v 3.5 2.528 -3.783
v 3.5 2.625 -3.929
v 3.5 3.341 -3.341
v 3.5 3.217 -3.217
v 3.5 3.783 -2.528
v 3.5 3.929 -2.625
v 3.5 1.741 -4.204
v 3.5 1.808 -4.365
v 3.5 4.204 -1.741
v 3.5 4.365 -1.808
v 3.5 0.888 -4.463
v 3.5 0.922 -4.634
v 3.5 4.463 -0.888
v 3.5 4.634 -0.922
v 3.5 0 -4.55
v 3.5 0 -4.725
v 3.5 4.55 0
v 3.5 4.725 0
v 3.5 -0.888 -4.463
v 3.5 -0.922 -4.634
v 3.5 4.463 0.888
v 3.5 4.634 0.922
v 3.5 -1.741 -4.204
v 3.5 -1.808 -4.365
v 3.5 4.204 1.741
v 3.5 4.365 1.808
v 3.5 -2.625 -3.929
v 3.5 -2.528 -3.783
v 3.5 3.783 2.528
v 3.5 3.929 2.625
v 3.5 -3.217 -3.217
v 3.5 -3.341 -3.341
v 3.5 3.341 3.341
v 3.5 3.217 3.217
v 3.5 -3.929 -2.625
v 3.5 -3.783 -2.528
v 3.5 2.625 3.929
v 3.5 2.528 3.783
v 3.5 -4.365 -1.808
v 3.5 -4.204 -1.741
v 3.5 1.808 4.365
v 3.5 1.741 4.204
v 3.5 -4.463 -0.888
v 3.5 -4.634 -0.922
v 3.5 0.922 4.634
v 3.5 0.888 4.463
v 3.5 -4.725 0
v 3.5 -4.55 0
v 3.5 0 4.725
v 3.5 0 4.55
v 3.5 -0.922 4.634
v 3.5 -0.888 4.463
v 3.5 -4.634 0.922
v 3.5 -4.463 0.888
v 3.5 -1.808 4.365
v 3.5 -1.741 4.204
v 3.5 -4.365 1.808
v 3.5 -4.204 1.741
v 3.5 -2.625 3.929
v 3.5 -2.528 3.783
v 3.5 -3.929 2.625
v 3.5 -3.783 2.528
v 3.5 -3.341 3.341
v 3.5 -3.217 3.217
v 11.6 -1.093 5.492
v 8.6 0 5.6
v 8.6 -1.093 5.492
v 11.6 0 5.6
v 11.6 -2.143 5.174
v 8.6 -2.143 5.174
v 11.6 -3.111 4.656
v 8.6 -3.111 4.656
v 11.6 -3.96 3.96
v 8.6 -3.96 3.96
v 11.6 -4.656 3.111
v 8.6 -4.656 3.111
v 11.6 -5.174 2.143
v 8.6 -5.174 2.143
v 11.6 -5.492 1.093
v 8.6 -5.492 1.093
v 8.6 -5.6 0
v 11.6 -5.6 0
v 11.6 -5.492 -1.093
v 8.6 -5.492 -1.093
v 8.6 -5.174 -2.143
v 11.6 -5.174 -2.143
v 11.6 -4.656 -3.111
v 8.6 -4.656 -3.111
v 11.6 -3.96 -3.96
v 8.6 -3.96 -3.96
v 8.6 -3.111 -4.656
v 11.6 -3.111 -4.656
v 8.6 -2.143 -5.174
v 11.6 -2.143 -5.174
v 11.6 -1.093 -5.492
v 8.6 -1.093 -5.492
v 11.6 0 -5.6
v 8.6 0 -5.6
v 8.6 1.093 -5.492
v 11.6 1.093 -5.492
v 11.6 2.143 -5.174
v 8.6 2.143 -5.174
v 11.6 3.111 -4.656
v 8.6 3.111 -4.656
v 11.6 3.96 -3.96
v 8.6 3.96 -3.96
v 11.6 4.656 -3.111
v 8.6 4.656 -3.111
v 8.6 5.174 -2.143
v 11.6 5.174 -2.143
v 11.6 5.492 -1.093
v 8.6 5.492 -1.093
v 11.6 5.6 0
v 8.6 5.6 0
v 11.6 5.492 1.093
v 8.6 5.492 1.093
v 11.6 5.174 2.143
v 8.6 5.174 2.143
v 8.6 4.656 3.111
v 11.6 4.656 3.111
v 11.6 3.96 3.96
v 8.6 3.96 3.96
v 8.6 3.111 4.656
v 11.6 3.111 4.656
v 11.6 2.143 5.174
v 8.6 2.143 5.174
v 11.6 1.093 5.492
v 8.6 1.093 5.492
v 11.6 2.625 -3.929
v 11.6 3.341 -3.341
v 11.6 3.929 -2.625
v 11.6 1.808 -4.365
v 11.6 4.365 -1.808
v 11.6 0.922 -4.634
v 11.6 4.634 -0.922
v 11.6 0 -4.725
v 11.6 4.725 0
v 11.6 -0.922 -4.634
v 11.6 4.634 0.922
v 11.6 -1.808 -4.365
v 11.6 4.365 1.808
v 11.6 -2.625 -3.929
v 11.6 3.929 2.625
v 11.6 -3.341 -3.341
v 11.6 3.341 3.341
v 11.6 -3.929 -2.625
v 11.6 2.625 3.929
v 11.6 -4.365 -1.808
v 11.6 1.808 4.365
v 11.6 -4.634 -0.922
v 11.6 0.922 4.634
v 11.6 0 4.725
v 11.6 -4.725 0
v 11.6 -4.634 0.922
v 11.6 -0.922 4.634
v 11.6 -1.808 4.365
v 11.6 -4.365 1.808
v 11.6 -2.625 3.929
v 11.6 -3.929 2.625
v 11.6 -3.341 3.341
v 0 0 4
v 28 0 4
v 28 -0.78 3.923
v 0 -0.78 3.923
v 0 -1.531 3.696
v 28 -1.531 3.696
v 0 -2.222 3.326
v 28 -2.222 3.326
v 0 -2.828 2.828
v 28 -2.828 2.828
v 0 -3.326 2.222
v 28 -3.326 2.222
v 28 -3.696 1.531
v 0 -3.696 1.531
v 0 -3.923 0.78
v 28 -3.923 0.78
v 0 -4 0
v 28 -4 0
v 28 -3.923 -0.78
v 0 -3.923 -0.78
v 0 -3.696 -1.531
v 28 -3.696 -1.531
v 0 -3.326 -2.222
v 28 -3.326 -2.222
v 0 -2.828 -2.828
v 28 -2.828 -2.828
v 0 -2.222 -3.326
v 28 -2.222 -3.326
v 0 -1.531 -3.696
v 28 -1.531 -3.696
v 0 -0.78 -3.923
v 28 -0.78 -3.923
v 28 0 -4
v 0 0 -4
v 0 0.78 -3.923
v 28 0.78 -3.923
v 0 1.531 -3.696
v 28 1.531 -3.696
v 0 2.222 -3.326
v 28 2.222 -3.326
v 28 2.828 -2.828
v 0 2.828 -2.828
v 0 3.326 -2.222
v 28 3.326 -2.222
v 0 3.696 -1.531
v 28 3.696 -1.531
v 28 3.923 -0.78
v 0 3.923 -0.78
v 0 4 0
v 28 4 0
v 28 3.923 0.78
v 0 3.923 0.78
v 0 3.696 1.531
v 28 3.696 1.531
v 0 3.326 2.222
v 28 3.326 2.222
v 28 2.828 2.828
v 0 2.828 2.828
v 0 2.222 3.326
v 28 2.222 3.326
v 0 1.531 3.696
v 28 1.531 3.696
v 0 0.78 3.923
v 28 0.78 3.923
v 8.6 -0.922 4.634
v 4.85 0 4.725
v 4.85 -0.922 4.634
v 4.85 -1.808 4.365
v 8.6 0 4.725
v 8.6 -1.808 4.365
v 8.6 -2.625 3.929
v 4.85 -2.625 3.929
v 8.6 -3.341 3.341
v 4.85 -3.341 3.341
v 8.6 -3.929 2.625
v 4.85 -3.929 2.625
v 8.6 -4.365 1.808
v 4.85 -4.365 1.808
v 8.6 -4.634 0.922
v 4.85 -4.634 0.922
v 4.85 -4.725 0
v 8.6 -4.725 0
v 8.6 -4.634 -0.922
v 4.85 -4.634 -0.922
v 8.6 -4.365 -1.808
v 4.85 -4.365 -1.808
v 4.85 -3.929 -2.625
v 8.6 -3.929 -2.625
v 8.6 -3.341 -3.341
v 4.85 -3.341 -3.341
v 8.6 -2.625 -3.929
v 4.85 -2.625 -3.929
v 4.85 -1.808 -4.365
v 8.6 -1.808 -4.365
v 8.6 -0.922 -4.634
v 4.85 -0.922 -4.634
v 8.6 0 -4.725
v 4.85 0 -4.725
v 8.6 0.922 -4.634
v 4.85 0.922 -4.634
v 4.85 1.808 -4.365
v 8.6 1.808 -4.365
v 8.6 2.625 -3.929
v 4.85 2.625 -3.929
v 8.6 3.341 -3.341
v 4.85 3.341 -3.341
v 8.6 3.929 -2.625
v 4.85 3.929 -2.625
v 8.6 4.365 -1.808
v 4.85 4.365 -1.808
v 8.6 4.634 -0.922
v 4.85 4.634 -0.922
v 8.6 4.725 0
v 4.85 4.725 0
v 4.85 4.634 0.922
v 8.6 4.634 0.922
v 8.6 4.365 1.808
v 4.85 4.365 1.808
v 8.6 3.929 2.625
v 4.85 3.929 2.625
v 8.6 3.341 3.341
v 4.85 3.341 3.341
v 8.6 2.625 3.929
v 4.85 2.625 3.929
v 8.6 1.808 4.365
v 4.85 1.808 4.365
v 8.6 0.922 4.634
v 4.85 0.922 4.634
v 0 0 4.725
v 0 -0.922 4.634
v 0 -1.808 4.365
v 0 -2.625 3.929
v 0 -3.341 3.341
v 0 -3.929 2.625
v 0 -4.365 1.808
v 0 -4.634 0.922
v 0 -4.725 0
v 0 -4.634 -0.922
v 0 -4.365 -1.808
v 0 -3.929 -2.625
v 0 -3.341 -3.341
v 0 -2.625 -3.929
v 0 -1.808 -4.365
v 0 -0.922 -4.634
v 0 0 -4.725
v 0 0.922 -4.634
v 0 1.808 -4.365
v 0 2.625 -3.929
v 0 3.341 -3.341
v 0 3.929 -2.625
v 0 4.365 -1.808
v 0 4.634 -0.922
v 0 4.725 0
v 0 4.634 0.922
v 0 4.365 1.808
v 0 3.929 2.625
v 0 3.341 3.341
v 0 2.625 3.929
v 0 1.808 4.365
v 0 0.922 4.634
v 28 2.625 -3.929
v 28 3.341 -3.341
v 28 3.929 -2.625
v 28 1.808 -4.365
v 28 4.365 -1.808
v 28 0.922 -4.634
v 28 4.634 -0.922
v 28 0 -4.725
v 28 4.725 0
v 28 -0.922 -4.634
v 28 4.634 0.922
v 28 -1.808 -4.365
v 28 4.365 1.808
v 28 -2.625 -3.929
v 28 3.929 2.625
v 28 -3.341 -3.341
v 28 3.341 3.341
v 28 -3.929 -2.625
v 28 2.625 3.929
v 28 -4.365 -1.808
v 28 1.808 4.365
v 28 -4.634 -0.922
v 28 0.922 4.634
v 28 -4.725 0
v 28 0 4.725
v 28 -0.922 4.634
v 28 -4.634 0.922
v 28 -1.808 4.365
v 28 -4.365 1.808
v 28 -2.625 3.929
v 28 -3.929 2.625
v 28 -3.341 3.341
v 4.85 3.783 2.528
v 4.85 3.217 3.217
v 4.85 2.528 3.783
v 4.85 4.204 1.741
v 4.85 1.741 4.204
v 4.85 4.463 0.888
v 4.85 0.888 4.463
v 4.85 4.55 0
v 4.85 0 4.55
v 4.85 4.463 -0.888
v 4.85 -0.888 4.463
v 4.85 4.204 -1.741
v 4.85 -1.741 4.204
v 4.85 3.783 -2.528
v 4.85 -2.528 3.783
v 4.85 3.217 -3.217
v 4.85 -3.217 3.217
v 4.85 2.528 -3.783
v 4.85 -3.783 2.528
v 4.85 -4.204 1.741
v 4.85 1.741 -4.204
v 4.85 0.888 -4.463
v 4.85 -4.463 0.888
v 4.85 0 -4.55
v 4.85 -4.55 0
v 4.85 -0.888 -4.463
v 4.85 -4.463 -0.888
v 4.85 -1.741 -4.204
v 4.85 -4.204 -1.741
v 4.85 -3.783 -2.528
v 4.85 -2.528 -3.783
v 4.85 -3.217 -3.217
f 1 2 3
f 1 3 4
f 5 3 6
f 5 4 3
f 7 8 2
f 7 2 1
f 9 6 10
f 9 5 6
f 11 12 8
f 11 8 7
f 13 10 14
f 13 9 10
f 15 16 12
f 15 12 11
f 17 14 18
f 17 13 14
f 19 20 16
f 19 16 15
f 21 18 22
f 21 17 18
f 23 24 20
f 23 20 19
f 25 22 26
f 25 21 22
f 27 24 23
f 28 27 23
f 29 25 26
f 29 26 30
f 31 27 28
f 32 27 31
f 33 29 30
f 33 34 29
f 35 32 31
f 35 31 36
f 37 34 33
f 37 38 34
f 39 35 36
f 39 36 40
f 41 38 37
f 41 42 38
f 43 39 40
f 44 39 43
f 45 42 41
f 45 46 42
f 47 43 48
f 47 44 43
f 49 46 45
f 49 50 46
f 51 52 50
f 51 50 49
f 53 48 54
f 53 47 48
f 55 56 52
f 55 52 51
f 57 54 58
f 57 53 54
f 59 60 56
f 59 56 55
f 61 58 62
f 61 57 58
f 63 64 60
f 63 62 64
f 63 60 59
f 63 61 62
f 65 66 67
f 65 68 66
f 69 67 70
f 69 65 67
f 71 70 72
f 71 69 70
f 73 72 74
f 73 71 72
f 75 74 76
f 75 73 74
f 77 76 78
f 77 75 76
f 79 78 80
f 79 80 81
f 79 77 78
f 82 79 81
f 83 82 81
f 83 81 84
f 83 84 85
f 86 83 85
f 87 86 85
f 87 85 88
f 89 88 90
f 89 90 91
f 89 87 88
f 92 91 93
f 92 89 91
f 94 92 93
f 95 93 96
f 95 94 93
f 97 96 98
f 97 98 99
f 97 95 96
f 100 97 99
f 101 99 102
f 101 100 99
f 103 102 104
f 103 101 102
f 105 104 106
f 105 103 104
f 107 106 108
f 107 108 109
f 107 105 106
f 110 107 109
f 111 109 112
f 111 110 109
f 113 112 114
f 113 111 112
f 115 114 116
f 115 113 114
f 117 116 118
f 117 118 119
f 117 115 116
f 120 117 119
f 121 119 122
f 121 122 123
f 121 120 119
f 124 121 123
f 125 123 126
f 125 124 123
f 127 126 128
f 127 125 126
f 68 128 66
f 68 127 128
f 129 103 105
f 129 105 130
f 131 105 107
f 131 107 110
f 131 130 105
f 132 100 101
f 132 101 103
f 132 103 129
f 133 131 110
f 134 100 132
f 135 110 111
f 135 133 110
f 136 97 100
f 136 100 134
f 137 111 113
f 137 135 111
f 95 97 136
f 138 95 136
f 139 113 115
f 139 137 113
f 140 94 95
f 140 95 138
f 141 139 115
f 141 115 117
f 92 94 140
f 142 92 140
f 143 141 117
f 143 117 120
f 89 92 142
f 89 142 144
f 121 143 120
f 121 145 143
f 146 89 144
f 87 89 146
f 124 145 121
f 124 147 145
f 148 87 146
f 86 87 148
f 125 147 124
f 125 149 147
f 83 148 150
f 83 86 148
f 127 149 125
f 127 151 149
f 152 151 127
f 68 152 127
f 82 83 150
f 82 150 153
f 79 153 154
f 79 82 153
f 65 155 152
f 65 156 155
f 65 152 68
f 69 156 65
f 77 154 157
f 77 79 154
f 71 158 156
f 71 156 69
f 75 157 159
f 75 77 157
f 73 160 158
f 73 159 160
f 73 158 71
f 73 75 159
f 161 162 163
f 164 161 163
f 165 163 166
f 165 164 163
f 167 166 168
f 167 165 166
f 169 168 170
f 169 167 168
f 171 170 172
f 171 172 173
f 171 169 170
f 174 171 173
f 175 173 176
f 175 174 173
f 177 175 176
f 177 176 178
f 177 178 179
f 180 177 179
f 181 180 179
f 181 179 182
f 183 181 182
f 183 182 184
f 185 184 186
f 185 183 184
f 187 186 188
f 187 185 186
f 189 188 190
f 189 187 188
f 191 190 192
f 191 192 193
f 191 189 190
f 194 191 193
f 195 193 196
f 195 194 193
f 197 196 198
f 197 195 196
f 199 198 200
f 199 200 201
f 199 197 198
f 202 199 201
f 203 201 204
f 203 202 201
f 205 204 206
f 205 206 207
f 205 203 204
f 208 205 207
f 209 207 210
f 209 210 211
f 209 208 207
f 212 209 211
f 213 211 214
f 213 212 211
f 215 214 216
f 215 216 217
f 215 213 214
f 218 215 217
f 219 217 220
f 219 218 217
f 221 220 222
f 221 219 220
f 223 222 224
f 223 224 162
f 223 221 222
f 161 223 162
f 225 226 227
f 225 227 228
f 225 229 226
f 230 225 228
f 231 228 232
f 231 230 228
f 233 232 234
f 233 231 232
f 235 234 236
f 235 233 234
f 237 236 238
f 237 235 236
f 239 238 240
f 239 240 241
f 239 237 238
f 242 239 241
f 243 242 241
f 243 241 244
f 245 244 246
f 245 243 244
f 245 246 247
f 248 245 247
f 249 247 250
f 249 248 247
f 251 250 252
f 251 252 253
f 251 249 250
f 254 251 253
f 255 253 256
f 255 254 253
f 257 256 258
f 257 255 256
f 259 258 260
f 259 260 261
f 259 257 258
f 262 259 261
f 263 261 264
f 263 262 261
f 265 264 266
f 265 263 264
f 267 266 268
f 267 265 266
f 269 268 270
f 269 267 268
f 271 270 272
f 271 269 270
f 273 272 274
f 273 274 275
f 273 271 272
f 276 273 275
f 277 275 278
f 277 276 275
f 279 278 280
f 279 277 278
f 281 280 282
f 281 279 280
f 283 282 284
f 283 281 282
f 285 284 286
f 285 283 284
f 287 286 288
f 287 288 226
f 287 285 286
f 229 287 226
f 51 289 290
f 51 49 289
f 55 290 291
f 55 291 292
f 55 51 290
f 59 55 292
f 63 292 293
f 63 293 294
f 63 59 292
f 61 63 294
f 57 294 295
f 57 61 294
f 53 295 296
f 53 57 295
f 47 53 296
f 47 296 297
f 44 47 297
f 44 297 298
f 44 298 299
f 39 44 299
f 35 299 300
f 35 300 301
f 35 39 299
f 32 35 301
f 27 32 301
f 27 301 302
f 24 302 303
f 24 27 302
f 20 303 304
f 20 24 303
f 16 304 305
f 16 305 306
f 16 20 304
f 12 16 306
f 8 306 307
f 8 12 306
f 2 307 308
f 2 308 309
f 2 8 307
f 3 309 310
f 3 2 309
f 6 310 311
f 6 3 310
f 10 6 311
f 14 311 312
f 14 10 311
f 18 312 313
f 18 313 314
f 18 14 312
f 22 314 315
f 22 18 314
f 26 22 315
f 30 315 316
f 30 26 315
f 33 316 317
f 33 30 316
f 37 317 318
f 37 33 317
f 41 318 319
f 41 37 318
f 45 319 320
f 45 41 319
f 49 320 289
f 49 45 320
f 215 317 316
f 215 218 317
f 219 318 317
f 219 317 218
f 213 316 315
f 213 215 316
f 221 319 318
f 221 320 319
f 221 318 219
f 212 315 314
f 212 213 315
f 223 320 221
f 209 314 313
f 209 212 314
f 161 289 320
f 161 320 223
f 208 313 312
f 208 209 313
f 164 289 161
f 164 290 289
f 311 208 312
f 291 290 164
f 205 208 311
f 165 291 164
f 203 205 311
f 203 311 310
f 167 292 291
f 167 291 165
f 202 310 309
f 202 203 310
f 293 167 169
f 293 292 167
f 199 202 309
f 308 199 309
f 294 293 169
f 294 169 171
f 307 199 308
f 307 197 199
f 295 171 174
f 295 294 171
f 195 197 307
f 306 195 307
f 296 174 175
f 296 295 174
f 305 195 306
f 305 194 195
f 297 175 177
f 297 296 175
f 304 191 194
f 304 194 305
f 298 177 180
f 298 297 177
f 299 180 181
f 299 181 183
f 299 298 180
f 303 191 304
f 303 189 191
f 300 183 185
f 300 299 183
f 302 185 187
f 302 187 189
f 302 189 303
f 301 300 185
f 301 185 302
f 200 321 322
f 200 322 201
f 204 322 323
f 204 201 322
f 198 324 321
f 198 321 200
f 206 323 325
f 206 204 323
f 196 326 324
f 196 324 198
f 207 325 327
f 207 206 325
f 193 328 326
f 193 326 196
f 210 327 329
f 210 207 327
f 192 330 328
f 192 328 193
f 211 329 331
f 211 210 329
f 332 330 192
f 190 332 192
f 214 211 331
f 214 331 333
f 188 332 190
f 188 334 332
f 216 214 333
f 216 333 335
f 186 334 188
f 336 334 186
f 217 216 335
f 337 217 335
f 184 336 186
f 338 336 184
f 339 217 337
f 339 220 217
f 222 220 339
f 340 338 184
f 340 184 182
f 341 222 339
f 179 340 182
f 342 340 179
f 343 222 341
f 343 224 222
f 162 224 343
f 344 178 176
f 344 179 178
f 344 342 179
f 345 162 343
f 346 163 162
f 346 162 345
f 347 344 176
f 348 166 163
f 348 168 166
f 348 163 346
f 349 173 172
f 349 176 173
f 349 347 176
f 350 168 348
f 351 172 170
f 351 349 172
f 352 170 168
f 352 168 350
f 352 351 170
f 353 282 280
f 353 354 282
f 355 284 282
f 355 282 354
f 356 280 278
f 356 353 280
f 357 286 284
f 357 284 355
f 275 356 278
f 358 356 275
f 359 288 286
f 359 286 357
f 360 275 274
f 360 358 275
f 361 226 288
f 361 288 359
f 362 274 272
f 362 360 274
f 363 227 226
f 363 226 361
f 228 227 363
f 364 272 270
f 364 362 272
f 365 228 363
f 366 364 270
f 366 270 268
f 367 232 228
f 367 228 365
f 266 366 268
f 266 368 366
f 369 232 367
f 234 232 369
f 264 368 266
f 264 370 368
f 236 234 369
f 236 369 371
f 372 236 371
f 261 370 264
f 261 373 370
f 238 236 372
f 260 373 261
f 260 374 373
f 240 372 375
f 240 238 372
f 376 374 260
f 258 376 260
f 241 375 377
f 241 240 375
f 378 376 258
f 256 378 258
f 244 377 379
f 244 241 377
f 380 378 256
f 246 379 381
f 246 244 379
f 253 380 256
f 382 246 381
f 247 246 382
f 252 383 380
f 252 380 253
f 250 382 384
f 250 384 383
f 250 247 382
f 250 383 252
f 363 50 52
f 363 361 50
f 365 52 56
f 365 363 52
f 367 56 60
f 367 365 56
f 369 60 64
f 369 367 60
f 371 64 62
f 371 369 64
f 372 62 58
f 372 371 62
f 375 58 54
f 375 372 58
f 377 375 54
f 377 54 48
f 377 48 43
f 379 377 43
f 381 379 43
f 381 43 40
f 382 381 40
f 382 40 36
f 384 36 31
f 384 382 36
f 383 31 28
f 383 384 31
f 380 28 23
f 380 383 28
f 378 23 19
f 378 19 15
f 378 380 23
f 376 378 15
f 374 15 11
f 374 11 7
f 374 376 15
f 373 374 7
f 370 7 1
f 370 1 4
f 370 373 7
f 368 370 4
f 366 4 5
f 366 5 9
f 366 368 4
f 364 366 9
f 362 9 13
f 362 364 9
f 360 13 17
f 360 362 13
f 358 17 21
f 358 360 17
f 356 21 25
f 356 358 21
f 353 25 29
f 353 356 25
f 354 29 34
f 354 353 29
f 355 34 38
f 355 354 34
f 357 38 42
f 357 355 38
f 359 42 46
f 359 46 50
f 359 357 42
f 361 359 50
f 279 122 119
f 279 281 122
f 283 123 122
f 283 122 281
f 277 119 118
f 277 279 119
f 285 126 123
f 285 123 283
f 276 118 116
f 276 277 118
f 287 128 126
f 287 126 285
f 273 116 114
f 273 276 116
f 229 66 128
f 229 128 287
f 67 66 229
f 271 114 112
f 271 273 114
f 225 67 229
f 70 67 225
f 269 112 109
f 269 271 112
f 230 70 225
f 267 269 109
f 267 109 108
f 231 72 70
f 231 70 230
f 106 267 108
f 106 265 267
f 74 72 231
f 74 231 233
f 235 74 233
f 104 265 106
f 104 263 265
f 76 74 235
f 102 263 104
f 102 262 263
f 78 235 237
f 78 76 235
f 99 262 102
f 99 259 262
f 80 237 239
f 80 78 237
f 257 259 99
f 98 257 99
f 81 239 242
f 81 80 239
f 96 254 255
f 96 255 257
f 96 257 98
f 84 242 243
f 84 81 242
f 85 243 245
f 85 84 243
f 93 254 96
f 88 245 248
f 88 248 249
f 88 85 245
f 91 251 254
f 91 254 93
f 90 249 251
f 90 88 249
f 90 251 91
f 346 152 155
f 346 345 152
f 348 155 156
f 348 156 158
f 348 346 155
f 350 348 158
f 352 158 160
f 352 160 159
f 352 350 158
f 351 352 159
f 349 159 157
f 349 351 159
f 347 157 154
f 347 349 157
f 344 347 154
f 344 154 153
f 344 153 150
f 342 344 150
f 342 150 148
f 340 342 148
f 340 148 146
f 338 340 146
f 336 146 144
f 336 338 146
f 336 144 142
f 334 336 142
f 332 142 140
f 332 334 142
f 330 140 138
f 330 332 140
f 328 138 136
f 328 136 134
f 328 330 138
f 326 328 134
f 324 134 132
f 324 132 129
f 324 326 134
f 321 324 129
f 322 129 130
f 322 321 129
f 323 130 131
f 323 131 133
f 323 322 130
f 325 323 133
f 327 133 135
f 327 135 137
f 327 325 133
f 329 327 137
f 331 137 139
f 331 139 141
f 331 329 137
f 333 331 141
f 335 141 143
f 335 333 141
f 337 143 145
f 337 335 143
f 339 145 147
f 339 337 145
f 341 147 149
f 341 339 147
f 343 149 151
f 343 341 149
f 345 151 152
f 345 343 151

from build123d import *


with BuildPart() as part:
    # Esboço1 → Revolução1 (revolve)
    with BuildSketch(Plane.XY, mode=Mode.PRIVATE) as revolu_o1_sk:
        Polygon((0, 4.725), (3.5, 4.725), (3.5, 4.55), (4.85, 4.55), (4.85, 4.725), (8.6, 4.725), (8.6, 5.6), (11.6, 5.6), (11.6, 4.725), (28, 4.725), (28, 4), (0, 4), align=None)
    revolve(revolu_o1_sk.sketch.rotate(Axis((0, 0, 0), (1, 0, 0)), 90), axis=Axis((0, 0, 0), (1, 0, 0)))


solid = part.part
